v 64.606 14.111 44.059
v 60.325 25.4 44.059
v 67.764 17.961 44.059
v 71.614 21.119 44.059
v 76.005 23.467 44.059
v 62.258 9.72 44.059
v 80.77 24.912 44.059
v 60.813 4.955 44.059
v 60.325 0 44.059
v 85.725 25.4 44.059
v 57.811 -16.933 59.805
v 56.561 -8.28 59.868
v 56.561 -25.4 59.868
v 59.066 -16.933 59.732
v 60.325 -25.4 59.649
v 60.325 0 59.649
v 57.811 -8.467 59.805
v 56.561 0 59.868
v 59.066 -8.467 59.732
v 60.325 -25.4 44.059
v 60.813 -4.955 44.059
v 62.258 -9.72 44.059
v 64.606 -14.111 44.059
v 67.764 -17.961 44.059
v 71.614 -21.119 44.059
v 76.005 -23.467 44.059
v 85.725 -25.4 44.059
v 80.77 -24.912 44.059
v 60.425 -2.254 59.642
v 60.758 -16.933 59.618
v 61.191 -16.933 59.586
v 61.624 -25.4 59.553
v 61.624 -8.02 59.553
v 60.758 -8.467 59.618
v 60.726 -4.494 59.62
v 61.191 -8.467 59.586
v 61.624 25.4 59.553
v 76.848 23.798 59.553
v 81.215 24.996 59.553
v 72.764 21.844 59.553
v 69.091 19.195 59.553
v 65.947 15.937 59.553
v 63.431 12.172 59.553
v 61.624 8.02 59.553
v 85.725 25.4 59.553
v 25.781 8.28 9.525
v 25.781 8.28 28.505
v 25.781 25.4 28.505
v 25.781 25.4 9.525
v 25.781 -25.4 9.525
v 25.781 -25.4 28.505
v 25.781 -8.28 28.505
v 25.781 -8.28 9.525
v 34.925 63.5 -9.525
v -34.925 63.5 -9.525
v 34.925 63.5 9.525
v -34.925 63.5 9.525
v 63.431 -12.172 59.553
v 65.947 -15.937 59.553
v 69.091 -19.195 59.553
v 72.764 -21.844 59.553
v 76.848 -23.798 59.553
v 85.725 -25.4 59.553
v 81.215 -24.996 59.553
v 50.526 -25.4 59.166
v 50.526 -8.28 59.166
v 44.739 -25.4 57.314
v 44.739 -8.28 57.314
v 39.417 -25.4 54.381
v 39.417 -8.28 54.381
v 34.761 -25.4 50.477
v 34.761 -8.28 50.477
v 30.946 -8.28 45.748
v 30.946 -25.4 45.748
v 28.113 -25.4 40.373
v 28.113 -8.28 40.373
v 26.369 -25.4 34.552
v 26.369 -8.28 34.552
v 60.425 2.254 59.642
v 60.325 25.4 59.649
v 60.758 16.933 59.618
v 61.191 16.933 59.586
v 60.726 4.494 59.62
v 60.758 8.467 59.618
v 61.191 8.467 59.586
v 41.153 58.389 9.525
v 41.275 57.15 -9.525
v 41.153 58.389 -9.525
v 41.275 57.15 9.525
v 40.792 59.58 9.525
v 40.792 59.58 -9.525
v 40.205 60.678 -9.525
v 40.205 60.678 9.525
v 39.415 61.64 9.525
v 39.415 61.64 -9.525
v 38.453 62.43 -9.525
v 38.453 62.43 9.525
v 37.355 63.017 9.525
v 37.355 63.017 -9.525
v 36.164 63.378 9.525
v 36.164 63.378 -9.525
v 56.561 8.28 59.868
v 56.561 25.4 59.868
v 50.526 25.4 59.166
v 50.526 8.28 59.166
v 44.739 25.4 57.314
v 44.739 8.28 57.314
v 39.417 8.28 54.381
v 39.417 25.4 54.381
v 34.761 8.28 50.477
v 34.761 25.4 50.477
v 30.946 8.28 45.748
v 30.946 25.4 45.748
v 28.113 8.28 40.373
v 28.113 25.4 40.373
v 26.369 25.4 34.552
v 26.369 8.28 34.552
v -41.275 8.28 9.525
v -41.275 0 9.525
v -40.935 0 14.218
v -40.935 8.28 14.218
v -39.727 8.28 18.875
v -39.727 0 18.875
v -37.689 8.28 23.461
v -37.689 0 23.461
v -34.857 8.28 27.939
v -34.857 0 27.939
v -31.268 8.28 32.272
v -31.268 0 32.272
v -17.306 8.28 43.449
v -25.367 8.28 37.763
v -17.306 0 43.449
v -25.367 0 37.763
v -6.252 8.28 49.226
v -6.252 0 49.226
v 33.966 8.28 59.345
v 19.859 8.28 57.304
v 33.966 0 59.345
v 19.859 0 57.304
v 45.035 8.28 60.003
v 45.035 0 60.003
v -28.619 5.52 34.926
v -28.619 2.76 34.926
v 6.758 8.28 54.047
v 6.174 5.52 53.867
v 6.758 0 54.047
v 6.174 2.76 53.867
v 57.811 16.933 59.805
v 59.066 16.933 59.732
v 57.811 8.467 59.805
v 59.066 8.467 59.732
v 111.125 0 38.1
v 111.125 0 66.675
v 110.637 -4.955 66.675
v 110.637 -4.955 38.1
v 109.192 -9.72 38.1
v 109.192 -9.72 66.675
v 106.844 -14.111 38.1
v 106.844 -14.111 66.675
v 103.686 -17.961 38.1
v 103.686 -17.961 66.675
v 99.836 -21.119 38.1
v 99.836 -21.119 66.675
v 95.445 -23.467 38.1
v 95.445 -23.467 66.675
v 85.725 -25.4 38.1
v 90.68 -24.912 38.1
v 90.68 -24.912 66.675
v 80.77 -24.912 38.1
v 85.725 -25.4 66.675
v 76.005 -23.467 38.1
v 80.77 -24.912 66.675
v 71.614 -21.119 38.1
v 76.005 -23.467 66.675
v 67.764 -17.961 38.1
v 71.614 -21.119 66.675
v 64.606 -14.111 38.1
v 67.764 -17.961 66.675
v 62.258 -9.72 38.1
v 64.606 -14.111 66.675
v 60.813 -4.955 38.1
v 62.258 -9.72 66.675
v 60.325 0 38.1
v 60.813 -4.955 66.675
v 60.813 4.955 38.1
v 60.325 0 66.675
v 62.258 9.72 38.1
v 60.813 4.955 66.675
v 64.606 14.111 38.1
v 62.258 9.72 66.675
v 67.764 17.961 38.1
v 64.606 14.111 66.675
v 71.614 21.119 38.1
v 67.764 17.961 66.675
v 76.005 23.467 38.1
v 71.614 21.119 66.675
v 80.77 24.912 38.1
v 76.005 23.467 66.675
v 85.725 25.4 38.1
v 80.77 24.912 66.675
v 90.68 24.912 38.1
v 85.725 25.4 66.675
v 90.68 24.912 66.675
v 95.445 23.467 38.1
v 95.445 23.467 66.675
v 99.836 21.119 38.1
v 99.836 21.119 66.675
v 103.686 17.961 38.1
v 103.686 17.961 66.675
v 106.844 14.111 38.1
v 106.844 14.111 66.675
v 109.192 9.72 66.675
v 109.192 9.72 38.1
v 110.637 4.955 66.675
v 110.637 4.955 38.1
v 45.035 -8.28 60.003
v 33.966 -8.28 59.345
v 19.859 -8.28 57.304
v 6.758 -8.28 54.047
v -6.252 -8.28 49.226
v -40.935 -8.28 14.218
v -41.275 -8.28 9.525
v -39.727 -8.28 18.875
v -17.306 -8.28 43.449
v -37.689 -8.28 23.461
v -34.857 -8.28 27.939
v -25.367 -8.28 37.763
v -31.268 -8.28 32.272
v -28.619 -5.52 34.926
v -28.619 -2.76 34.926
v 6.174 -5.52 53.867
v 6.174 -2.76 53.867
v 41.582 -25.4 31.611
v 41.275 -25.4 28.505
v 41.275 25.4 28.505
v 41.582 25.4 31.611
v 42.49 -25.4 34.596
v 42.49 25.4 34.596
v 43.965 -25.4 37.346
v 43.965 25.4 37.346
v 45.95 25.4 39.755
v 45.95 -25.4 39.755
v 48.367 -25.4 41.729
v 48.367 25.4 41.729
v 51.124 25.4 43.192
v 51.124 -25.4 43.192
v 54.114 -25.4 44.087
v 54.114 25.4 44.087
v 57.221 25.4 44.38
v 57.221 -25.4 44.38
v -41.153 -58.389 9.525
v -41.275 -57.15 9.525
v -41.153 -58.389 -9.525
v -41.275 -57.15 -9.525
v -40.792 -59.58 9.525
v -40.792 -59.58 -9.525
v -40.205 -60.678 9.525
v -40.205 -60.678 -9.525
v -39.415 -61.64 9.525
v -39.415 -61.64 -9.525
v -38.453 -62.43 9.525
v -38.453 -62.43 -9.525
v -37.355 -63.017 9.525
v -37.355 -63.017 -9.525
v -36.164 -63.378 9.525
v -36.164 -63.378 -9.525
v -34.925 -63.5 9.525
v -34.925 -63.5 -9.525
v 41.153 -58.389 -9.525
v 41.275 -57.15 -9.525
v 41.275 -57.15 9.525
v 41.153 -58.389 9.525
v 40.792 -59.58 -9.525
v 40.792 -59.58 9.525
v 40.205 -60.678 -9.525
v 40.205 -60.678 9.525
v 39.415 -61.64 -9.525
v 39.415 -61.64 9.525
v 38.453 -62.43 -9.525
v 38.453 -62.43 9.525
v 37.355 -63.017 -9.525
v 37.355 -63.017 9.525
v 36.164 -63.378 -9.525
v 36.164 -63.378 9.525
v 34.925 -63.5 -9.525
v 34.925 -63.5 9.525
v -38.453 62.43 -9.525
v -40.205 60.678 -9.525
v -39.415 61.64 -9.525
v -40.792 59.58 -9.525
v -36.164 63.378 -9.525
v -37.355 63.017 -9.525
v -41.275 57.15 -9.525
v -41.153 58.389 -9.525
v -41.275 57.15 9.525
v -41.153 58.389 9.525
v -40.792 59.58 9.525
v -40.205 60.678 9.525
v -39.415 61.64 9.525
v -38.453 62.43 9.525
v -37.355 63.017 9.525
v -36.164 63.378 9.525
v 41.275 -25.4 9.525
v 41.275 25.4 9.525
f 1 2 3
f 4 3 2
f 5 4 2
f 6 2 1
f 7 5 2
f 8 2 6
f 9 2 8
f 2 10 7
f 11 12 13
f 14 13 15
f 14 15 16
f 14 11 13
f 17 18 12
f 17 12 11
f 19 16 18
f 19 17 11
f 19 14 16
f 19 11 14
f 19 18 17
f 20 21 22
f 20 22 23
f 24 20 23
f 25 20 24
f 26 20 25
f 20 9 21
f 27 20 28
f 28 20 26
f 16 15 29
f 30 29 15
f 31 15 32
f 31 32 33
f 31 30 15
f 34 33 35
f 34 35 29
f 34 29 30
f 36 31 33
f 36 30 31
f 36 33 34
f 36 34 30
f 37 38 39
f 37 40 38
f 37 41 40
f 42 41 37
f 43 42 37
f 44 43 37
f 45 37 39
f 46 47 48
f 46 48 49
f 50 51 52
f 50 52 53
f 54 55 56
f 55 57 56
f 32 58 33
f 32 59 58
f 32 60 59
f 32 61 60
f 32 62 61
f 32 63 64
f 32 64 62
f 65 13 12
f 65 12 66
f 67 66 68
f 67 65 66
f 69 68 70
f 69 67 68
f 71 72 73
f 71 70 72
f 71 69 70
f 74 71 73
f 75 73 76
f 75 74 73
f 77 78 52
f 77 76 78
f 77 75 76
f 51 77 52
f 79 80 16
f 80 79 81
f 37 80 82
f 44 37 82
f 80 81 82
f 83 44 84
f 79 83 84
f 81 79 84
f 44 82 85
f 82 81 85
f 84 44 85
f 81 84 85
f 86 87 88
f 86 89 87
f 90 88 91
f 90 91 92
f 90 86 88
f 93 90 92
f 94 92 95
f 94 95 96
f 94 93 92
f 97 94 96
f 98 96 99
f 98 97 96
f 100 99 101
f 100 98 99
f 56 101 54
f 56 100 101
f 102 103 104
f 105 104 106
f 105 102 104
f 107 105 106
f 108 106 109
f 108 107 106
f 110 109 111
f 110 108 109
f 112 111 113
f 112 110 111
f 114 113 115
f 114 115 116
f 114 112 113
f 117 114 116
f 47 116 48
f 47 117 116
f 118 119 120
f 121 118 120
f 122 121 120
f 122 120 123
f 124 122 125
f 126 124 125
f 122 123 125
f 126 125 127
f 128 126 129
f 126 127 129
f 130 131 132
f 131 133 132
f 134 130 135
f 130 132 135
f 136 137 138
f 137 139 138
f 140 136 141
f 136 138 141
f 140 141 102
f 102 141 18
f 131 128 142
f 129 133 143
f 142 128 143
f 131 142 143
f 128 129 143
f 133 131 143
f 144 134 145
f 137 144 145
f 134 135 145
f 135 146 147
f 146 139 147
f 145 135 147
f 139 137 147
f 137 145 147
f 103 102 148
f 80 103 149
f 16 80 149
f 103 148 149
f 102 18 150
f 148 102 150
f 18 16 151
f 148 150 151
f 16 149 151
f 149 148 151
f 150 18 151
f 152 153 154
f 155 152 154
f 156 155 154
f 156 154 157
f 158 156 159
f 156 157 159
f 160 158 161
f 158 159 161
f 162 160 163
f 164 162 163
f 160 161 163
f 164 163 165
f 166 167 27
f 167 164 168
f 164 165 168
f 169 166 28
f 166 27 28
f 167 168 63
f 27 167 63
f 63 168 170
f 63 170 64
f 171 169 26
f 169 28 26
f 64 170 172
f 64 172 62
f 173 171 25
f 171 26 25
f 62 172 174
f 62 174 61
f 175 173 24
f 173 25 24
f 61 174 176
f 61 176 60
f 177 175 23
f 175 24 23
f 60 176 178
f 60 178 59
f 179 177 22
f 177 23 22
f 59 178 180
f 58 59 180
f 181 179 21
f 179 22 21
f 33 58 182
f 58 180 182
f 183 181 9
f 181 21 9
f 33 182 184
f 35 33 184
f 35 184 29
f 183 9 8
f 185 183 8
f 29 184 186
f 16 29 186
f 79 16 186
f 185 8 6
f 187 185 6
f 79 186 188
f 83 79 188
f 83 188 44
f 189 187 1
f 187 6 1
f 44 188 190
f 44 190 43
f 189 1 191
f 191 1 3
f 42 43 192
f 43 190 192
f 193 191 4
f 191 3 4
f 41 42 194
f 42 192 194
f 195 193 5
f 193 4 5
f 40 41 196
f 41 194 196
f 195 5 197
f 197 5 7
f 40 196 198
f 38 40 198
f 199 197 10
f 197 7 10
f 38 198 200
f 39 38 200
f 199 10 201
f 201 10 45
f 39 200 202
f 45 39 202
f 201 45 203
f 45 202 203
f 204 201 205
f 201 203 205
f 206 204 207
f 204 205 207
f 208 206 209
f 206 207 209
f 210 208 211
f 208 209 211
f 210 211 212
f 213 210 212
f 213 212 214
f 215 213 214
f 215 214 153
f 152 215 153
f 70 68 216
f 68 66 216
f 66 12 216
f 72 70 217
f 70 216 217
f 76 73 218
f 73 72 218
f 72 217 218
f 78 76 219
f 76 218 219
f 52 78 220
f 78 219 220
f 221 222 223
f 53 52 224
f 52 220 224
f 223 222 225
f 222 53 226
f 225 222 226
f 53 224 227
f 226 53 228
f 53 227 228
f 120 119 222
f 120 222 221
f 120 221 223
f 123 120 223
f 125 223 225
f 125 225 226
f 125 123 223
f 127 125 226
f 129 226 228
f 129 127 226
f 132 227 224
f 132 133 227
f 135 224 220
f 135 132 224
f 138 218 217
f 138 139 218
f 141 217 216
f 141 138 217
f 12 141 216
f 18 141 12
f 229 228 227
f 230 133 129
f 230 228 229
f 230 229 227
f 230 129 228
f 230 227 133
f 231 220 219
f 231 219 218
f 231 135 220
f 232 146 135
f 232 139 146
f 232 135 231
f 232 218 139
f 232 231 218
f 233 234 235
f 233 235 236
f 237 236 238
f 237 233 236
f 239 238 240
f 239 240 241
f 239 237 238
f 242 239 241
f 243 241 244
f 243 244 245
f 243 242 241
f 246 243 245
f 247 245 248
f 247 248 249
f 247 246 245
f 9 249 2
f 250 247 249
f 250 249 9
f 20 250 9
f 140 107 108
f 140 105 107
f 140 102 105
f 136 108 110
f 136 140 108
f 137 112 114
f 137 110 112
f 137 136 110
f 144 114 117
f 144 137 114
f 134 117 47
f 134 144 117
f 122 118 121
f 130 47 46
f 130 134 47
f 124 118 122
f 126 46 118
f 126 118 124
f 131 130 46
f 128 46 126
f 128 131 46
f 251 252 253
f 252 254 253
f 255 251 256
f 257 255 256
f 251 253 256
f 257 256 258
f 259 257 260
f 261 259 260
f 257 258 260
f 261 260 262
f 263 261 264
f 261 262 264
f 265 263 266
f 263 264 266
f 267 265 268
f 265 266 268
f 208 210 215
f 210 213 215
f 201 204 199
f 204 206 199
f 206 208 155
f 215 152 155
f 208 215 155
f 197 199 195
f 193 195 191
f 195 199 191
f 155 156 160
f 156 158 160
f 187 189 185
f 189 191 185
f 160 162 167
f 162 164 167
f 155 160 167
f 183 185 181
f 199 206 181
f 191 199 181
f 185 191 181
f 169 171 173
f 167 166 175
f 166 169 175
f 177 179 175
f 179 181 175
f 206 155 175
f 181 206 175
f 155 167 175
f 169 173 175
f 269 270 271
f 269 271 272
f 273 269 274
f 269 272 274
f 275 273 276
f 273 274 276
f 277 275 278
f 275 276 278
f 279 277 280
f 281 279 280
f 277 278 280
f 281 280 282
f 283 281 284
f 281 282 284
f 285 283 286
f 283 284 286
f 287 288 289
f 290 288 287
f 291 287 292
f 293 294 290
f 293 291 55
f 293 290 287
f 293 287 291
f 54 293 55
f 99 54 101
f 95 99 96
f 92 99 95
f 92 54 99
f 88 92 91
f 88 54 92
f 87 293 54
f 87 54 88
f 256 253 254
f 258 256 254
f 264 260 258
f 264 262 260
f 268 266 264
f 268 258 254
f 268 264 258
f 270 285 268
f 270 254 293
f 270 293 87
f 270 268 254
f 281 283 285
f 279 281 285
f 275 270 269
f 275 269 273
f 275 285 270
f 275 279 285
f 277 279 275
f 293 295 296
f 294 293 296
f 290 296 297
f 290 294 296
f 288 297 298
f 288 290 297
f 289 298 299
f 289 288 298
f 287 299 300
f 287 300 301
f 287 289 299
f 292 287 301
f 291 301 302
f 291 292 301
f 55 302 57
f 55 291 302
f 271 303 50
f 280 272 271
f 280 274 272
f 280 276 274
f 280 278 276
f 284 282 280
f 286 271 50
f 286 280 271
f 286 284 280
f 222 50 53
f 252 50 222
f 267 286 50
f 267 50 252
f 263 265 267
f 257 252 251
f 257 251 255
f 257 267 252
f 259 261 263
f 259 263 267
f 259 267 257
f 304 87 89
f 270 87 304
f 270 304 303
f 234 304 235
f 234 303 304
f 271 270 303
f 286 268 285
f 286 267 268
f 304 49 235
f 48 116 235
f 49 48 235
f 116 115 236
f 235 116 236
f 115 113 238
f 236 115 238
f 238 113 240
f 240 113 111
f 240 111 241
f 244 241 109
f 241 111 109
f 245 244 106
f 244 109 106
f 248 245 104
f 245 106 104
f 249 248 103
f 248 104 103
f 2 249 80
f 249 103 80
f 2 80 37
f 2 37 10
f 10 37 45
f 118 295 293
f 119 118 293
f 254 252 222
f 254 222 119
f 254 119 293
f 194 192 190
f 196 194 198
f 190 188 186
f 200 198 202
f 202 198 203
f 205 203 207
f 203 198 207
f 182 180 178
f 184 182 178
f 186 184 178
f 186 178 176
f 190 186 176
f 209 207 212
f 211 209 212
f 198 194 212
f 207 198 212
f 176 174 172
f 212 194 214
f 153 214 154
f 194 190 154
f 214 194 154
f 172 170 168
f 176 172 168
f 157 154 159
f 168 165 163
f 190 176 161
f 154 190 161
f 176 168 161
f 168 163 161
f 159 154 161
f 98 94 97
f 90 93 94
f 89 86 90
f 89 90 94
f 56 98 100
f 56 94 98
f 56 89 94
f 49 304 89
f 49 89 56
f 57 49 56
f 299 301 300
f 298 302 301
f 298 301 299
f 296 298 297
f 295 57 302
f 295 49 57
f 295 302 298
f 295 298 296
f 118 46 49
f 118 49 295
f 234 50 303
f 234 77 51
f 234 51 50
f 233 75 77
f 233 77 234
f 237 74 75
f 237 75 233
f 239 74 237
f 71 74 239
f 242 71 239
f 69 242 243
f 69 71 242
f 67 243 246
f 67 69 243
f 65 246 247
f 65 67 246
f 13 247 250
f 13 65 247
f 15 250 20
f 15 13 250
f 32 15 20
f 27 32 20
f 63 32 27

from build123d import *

# Parameters (mm, degrees)
F1_DEPTH = 63.5
F2_DEPTH = 25.4
F3_DEPTH = 8.2804
F5_R     = 6.35


with BuildPart() as f1:
    # F0 (on Front) → F1 (new body, symmetric)
    with BuildSketch(Plane.XZ):
        Polygon((-41.275, -9.525), (41.275, -9.525), (41.275, 9.525), (25.780999, 9.525), (-41.275, 9.525), align=None)
    extrude(amount=F1_DEPTH, both=True)

    # F0 (on Front) → F2 (join, symmetric)
    with BuildSketch(Plane.XZ):
        with BuildLine():
            Line((25.780999, 9.525), (41.275, 9.525))
            Line((41.275, 9.525), (41.275, 28.504782))
            ThreePointArc((41.275, 28.504782), (47.109768, 40.801504), (60.325, 44.059042))
            Line((60.325, 44.059042), (60.325, 59.648656))
            add(Edge.make_bspline(
                [(56.560999, 59.868252), (57.809032, 59.80963), (59.063808, 59.736539), (60.325, 59.648656)],
                knots=[111.091867, 111.091867, 111.091867, 111.091867, 113.567541, 113.567541, 113.567541, 113.567541], degree=3))
            ThreePointArc((56.560999, 59.868252), (34.761492, 50.476785), (25.780999, 28.504782))
            Line((25.780999, 28.504782), (25.780999, 9.525))
        make_face()
        with BuildLine():
            Line((60.325, 59.648656), (60.325, 44.059042))
            Line((60.325, 44.059042), (85.725, 44.059042))
            Line((85.725, 44.059042), (85.725, 59.553043))
            Line((85.725, 59.553043), (61.62434, 59.553043))
            add(Edge.make_bspline(
                [(60.325, 59.648656), (60.757364, 59.618527), (61.190481, 59.586661), (61.62434, 59.553043)],
                knots=[113.567541, 113.567541, 113.567541, 113.567541, 114.416254, 114.416254, 114.416254, 114.416254], degree=3))
        make_face()
    extrude(amount=F2_DEPTH, both=True)

    # F0 (on Front) → F3 (join, symmetric)
    with BuildSketch(Plane.XZ):
        with BuildLine():
            add(Edge.make_bspline(
                [(-41.275, 9.525), (-41.868726, 35.994224), (0.557538, 62.498833), (56.560999, 59.868252)],
                knots=[0, 0, 0, 0, 111.091867, 111.091867, 111.091867, 111.091867], degree=3))
            Line((-41.275, 9.525), (25.780999, 9.525))
            Line((25.780999, 9.525), (25.780999, 28.504782))
            ThreePointArc((25.780999, 28.504782), (34.761492, 50.476785), (56.560999, 59.868252))
        make_face()
    extrude(amount=F3_DEPTH, both=True)

    # F0 (on Front) → F4 (revolve)
    with BuildSketch(Plane.XZ):
        Polygon((85.725, 59.553043), (85.725, 44.059042), (85.725, 38.1), (111.125, 38.1), (111.125, 66.675), (85.725, 66.675), align=None)
    revolve(axis=Axis((85.725, 0, 52.3875), (0, 0, -1)))

    # F5
    f5_edges = [f1.edges().sort_by_distance(p)[0] for p in [
        (41.275, -63.5, 0),
        (-41.275, -63.5, 0),
        (-41.275, 63.5, 0),
        (41.275, 63.5, 0),
    ]]
    fillet(f5_edges, radius=F5_R)


solid = f1.part
